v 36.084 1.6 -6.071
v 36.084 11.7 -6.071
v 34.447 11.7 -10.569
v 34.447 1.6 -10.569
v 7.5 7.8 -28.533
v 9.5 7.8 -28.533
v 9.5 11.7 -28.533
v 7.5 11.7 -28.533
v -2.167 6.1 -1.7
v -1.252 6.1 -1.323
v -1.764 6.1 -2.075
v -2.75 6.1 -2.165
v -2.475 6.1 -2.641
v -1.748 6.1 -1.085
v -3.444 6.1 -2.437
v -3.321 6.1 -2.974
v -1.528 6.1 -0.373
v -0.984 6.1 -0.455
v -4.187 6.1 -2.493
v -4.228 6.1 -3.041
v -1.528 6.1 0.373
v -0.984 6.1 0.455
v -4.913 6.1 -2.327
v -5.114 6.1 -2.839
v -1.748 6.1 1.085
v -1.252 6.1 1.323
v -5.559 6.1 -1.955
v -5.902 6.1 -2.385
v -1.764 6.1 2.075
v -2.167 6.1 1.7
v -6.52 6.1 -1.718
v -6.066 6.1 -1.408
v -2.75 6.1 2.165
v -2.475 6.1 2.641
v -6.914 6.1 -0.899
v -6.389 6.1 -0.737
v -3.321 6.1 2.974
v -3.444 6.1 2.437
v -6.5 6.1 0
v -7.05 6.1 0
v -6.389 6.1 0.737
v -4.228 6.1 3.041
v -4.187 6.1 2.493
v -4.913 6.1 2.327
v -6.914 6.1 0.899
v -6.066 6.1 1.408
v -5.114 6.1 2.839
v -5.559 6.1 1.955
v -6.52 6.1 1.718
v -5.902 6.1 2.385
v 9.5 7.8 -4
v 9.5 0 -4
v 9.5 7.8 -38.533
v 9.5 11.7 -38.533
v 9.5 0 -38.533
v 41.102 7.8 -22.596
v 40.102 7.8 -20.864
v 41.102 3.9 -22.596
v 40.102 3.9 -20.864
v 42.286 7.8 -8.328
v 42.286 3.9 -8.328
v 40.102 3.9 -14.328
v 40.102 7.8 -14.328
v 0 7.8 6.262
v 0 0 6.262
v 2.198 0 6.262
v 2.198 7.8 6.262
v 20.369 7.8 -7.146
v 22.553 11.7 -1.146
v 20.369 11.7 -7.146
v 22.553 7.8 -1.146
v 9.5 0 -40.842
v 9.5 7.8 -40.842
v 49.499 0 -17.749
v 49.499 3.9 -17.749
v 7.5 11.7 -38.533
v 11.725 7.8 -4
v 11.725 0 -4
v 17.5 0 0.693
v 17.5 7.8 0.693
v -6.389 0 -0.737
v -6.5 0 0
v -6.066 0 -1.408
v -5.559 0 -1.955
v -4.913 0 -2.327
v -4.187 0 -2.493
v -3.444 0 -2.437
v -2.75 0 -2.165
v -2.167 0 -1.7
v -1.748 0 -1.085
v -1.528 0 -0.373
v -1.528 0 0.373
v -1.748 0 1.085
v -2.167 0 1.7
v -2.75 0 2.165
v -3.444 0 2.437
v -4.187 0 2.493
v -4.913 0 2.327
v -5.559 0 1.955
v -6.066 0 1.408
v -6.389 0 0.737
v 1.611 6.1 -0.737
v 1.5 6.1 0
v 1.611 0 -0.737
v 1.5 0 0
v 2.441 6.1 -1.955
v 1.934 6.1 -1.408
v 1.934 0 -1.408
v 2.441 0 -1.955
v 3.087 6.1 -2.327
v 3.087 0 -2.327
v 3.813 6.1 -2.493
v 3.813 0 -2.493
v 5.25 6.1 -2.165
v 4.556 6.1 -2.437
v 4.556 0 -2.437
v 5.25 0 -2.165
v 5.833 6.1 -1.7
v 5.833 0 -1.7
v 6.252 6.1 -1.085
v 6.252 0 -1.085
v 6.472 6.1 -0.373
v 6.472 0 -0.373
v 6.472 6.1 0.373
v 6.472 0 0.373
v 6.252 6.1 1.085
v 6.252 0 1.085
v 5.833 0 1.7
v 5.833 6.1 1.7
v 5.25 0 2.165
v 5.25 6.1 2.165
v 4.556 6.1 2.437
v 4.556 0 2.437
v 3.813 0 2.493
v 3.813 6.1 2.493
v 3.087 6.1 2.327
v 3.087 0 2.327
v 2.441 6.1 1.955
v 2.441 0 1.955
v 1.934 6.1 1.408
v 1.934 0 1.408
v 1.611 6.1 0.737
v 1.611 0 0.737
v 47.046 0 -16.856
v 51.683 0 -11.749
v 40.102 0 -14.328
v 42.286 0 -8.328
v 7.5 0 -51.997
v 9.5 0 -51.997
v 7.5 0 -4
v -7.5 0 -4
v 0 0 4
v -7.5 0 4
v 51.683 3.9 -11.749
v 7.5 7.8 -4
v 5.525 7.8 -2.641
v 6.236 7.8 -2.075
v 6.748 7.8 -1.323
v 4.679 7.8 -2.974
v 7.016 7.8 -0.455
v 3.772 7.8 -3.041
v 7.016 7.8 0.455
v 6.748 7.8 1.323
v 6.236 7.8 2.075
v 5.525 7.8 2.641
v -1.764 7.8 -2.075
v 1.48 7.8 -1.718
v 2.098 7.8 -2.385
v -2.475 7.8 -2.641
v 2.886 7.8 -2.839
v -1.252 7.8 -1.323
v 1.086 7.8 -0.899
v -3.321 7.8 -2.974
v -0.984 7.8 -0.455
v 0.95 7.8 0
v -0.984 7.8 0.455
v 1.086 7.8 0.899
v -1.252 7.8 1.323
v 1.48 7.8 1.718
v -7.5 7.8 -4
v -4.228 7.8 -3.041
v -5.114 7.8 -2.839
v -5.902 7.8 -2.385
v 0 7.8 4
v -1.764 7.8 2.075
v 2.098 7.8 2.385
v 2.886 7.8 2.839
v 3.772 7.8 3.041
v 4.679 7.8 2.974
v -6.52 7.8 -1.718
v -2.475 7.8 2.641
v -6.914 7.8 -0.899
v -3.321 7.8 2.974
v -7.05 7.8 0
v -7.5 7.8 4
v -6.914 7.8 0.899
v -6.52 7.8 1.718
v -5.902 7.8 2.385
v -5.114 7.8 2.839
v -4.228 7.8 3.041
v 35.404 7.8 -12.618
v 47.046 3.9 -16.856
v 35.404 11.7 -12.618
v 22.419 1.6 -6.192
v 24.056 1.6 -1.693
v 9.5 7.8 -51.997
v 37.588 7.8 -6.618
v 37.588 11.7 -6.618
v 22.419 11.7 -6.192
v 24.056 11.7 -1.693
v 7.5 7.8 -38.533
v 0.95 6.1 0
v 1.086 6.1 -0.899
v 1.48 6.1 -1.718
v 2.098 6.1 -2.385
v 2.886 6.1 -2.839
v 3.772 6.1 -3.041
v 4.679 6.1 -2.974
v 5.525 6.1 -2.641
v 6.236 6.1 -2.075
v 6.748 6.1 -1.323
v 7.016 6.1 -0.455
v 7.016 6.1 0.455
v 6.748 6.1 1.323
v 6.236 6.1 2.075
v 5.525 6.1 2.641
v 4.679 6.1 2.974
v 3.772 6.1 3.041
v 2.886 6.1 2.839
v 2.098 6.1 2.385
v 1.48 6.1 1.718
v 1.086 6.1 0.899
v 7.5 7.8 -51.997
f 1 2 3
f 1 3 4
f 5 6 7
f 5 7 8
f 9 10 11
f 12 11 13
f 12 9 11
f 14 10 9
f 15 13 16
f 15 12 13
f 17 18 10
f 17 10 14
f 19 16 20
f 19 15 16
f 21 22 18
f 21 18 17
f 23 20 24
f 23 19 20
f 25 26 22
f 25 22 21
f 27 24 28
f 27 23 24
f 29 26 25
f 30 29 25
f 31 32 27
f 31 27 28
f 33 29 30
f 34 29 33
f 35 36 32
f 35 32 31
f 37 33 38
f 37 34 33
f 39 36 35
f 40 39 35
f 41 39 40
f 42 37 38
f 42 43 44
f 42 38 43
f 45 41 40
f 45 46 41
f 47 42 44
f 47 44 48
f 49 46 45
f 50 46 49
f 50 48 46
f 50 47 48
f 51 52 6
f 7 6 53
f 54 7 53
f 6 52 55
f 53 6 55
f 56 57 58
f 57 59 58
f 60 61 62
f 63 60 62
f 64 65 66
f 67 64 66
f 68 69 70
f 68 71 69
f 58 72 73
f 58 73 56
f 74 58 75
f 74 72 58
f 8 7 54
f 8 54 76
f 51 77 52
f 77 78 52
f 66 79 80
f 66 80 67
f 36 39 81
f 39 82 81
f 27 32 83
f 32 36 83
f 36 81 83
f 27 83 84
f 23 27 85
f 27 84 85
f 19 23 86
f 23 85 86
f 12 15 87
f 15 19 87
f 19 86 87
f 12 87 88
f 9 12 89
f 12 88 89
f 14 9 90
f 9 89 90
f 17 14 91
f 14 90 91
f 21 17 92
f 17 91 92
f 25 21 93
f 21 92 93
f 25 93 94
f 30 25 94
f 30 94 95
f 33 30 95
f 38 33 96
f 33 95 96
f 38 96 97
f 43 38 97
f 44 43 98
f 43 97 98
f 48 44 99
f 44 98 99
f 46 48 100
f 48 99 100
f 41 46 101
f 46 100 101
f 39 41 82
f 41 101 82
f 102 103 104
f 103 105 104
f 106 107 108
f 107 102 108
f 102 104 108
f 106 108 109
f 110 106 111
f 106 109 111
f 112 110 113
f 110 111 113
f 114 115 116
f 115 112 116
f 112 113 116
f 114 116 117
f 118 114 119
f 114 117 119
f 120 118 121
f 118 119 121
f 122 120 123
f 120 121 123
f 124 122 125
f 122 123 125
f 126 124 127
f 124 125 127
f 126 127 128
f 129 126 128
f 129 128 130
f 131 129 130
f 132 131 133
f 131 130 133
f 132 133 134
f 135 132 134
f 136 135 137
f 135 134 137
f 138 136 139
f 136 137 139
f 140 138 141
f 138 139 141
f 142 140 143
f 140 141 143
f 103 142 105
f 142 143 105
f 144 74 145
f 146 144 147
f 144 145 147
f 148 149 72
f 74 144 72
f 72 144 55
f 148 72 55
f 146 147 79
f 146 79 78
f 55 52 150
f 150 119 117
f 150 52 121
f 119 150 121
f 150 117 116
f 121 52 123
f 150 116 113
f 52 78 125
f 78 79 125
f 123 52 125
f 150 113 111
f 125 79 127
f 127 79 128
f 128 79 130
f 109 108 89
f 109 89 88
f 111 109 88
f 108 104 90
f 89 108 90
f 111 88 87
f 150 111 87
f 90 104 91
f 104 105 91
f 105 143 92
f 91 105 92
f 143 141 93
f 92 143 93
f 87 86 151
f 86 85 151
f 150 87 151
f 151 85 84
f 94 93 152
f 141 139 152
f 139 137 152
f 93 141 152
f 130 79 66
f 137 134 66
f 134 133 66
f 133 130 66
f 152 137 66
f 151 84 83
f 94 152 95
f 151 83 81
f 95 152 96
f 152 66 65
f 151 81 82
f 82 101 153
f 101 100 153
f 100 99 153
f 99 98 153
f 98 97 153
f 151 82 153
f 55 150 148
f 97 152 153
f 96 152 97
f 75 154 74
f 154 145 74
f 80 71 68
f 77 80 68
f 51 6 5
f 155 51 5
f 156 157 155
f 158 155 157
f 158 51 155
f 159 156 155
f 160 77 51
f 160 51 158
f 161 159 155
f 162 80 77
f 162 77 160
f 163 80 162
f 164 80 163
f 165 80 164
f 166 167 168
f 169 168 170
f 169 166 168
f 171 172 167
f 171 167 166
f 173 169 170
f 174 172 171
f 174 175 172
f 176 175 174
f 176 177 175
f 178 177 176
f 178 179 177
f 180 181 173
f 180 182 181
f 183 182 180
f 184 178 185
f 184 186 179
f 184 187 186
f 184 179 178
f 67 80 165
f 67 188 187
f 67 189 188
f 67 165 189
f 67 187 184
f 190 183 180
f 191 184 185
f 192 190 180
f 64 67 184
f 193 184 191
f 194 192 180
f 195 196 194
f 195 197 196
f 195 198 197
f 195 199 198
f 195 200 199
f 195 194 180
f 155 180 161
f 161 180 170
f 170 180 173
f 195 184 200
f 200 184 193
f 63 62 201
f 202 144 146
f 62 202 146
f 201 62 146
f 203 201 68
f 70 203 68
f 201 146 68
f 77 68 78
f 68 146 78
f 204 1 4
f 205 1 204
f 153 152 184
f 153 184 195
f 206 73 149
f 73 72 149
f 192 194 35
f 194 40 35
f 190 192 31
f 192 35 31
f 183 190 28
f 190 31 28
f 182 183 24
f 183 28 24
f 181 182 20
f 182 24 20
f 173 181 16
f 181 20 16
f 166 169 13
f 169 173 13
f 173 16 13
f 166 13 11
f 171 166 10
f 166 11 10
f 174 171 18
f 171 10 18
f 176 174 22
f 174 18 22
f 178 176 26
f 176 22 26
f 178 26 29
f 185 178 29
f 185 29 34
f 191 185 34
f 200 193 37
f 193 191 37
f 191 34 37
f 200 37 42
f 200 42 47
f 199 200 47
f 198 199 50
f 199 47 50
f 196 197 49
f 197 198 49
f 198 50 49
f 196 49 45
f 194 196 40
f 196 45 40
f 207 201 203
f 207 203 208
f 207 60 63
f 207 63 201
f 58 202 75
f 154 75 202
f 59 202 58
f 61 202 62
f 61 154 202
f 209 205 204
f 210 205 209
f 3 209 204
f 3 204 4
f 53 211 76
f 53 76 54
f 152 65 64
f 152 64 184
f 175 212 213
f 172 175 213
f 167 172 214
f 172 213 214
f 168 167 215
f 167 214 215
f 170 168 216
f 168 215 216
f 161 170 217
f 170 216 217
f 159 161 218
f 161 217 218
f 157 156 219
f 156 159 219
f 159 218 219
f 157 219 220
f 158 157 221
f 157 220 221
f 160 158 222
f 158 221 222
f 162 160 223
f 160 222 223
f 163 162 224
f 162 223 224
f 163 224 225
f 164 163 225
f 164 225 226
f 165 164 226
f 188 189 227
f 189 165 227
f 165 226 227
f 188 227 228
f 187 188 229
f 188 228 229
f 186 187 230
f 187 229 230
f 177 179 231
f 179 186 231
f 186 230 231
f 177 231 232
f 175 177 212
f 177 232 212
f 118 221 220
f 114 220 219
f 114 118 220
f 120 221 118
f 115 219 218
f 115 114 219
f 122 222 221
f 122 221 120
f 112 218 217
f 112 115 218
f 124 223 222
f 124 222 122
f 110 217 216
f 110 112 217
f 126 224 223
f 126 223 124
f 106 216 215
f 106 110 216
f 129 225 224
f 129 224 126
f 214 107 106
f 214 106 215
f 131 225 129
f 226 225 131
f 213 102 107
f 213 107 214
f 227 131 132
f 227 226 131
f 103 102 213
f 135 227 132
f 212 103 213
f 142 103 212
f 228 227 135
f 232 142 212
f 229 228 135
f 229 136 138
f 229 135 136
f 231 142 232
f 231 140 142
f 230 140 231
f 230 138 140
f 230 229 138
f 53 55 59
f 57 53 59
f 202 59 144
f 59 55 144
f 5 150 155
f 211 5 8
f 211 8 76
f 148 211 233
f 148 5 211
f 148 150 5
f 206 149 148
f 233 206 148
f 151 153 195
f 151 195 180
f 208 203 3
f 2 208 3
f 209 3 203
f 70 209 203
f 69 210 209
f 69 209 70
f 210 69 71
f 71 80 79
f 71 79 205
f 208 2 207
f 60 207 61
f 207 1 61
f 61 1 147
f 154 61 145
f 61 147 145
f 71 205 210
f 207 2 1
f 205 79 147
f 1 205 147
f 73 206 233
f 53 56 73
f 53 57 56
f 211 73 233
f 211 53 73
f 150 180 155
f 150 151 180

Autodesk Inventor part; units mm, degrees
ref_plane "YZ Plane" through (0, 0, 0) normal (1, 0, 0) x (0, 1, 0)
ref_plane "XZ Plane" through (0, 0, 0) normal (0, 1, 0) x (-1, 0, 0)
ref_plane "XY Plane" through (0, 0, 0) normal (0, 0, 1) x (1, 0, 0)
sketch "Sketch2" plane through (0, 0, 0) normal (0, 1, 0) x (-1, 0, 0)
  line L0 (7.5, -4) -> (-7.5, -4)
  line L1 (-7.5, -4) -> (-7.5, 4)
  line L2 (-7.5, 4) -> (7.5, 4)
  line L3 (7.5, 4) -> (7.5, -4)
  circle A0 centre (4, 0) radius 2.5
  circle A1 centre (-4, 0) radius 2.5
  line L4 (0, -4) -> (0, 11) construction
  circle A2 centre (0, 11) radius 3.7 construction
  line L5 (-30.3941, -4) -> (1.2655, 7.5231) construction
  line L6 (-17.5, -4) -> (-17.5, 0.6931)
  line L7 (-17.5, 0.6931) -> (0, 7.0625)
  line L8 (0, 7.0625) -> (0, 4)
  line L9 (-17.5, -4) -> (-7.5, -4)
  line L10 (-11.8902, 2.7349) -> (-12.4882, 4.3778) construction
  line L11 (-17.5, 0.6931) -> (-51.6831, -11.7486)
  line L12 (-51.6831, -11.7486) -> (-49.4993, -17.7486)
  circle A3 centre (0, 7.0625) radius 55 construction
  line L13 (0, 14.7) -> (0, 62.0625) construction
  line L14 (-49.4993, -17.7486) -> (-11.7254, -4)
  line L15 (-7.5, -4) -> (-7.5, -41.9969)
  line L16 (-7.5, -41.9969) -> (-49.4993, -17.7486)
  line L17 (-9.5, -4) -> (-9.5, -38.5328)
  line L18 (-9.5, -38.5328) -> (-47.0459, -16.8556)
  line L19 (0, 6.2625) -> (-2.198, 6.2625)
  line L20 (-22.5526, -1.1459) -> (-20.3688, -7.1459)
  line L21 (-20.3688, -7.1459) -> (-35.4039, -12.6183)
  line L22 (-35.4039, -12.6183) -> (-37.5877, -6.6183)
  line L23 (-37.5877, -6.6183) -> (-22.5526, -1.1459)
  line L24 (-9.5, -38.5328) -> (-9.5, -51.9969)
  line L25 (-9.5, -51.9969) -> (-7.5, -51.9969)
  line L26 (-7.5, -51.9969) -> (-7.5, -41.9969)
  arc A4 (0, 47.0625) -> (-37.5877, -6.6183) centre (0, 7.0625) ccw construction
  line L27 (-7.5, -38.5328) -> (-9.5, -38.5328)
  line L28 (-9.5, -38.5328) -> (-9.5, -28.5328)
  line L29 (-9.5, -28.5328) -> (-7.5, -28.5328)
  line L30 (-7.5, -28.5328) -> (-7.5, -38.5328)
  circle A5 centre (4, 0) radius 3.05
  circle A6 centre (-4, 0) radius 3.05
  line L31 (-42.2862, -8.3284) -> (-40.1023, -14.3284)
  line L32 (-40.1023, -20.8645) -> (-41.1023, -22.5965)
  point P0 (0, 0)
  point P1 (7.5, 0)
  point P2 (0, 3.5)
  point P3 (-9.5, -40.8422)
  dimension "d6" = 5
  dimension "d7" = 8
  dimension "d9" = 11
  dimension "d10" = 7.4
  dimension "d11" = 8
  dimension "d12" = 15
  dimension "d13" = 70
  dimension "d14" = 10
  dimension "d21" = 14
  dimension "d25" = 55
  dimension "d27" = 6
  dimension "d35" = 60
  dimension "d36" = 3.5
  dimension "d37" = 2
  dimension "d38" = 2
  dimension "d39" = 0.8
  dimension "d40" = 10
  dimension "d41" = 40
  dimension "d42" = 16
  dimension "d43" = 10
  dimension "d46" = 6.1
  dimension "d47" = 6.1
  dimension "d50" = 10
extrude "Extrusion1" add sketch "Sketch2" along normal blind 7.8 contours L0 L1 L2 L3 | L9 L6 L7 L19 L8 L2 L1 | L15 L29 L17 L9 | L14 L20 L11 L6 L9 | L15 L16 L24 L27 | L24 L16 L32 L18 | L26 L25 L24 L16 | L14 L31 L11 L22
extrude "Wyciągnięcie proste3" add sketch "Sketch2" along normal blind 11.7 contours L15 L27 L17 L29 | L14 L22 L11 L20
extrude "Wyciągnięcie proste4" add sketch "Sketch2" along normal blind 6.1 contours A5 | A6
extrude "Wyciągnięcie proste5" add sketch "Sketch2" along normal blind 3.9 contours L32 L16 L14 L18 | L14 L12 L11 L31
sketch "Szkic6" plane through (2.198, 0, 6.2625) normal (0.342, 0, 0.9397) x (0.9397, 0, -0.342)
  line L0 (21.661, 11.7) -> (37.661, 11.7) projected
  line L1 (23.261, 11.7) -> (36.061, 11.7)
  line L2 (36.061, 11.7) -> (36.061, 1.6)
  line L3 (36.061, 1.6) -> (23.261, 1.6)
  line L4 (23.261, 1.6) -> (23.261, 11.7)
  line L5 (37.661, 7.8) -> (37.661, 11.7) projected
  line L6 (21.661, 7.8) -> (21.661, 11.7) projected
  line L7 (0, 0) -> (52.661, 0) projected
  point P0 (0.0765, 0)
  point P1 (37.661, 9.75)
  point P2 (21.661, 9.75)
  dimension "d59" = 1.6
  dimension "d60" = 1.6
  dimension "d61" = 1.6
extrude "Wyciągnięcie proste7" cut sketch "Szkic6" against normal blind 4.785
mirror "Odbij1" [suppressed]
equation "\"d38\" = d37"
equation "\"d47\" = d46"
properties part number "blokerv9"
